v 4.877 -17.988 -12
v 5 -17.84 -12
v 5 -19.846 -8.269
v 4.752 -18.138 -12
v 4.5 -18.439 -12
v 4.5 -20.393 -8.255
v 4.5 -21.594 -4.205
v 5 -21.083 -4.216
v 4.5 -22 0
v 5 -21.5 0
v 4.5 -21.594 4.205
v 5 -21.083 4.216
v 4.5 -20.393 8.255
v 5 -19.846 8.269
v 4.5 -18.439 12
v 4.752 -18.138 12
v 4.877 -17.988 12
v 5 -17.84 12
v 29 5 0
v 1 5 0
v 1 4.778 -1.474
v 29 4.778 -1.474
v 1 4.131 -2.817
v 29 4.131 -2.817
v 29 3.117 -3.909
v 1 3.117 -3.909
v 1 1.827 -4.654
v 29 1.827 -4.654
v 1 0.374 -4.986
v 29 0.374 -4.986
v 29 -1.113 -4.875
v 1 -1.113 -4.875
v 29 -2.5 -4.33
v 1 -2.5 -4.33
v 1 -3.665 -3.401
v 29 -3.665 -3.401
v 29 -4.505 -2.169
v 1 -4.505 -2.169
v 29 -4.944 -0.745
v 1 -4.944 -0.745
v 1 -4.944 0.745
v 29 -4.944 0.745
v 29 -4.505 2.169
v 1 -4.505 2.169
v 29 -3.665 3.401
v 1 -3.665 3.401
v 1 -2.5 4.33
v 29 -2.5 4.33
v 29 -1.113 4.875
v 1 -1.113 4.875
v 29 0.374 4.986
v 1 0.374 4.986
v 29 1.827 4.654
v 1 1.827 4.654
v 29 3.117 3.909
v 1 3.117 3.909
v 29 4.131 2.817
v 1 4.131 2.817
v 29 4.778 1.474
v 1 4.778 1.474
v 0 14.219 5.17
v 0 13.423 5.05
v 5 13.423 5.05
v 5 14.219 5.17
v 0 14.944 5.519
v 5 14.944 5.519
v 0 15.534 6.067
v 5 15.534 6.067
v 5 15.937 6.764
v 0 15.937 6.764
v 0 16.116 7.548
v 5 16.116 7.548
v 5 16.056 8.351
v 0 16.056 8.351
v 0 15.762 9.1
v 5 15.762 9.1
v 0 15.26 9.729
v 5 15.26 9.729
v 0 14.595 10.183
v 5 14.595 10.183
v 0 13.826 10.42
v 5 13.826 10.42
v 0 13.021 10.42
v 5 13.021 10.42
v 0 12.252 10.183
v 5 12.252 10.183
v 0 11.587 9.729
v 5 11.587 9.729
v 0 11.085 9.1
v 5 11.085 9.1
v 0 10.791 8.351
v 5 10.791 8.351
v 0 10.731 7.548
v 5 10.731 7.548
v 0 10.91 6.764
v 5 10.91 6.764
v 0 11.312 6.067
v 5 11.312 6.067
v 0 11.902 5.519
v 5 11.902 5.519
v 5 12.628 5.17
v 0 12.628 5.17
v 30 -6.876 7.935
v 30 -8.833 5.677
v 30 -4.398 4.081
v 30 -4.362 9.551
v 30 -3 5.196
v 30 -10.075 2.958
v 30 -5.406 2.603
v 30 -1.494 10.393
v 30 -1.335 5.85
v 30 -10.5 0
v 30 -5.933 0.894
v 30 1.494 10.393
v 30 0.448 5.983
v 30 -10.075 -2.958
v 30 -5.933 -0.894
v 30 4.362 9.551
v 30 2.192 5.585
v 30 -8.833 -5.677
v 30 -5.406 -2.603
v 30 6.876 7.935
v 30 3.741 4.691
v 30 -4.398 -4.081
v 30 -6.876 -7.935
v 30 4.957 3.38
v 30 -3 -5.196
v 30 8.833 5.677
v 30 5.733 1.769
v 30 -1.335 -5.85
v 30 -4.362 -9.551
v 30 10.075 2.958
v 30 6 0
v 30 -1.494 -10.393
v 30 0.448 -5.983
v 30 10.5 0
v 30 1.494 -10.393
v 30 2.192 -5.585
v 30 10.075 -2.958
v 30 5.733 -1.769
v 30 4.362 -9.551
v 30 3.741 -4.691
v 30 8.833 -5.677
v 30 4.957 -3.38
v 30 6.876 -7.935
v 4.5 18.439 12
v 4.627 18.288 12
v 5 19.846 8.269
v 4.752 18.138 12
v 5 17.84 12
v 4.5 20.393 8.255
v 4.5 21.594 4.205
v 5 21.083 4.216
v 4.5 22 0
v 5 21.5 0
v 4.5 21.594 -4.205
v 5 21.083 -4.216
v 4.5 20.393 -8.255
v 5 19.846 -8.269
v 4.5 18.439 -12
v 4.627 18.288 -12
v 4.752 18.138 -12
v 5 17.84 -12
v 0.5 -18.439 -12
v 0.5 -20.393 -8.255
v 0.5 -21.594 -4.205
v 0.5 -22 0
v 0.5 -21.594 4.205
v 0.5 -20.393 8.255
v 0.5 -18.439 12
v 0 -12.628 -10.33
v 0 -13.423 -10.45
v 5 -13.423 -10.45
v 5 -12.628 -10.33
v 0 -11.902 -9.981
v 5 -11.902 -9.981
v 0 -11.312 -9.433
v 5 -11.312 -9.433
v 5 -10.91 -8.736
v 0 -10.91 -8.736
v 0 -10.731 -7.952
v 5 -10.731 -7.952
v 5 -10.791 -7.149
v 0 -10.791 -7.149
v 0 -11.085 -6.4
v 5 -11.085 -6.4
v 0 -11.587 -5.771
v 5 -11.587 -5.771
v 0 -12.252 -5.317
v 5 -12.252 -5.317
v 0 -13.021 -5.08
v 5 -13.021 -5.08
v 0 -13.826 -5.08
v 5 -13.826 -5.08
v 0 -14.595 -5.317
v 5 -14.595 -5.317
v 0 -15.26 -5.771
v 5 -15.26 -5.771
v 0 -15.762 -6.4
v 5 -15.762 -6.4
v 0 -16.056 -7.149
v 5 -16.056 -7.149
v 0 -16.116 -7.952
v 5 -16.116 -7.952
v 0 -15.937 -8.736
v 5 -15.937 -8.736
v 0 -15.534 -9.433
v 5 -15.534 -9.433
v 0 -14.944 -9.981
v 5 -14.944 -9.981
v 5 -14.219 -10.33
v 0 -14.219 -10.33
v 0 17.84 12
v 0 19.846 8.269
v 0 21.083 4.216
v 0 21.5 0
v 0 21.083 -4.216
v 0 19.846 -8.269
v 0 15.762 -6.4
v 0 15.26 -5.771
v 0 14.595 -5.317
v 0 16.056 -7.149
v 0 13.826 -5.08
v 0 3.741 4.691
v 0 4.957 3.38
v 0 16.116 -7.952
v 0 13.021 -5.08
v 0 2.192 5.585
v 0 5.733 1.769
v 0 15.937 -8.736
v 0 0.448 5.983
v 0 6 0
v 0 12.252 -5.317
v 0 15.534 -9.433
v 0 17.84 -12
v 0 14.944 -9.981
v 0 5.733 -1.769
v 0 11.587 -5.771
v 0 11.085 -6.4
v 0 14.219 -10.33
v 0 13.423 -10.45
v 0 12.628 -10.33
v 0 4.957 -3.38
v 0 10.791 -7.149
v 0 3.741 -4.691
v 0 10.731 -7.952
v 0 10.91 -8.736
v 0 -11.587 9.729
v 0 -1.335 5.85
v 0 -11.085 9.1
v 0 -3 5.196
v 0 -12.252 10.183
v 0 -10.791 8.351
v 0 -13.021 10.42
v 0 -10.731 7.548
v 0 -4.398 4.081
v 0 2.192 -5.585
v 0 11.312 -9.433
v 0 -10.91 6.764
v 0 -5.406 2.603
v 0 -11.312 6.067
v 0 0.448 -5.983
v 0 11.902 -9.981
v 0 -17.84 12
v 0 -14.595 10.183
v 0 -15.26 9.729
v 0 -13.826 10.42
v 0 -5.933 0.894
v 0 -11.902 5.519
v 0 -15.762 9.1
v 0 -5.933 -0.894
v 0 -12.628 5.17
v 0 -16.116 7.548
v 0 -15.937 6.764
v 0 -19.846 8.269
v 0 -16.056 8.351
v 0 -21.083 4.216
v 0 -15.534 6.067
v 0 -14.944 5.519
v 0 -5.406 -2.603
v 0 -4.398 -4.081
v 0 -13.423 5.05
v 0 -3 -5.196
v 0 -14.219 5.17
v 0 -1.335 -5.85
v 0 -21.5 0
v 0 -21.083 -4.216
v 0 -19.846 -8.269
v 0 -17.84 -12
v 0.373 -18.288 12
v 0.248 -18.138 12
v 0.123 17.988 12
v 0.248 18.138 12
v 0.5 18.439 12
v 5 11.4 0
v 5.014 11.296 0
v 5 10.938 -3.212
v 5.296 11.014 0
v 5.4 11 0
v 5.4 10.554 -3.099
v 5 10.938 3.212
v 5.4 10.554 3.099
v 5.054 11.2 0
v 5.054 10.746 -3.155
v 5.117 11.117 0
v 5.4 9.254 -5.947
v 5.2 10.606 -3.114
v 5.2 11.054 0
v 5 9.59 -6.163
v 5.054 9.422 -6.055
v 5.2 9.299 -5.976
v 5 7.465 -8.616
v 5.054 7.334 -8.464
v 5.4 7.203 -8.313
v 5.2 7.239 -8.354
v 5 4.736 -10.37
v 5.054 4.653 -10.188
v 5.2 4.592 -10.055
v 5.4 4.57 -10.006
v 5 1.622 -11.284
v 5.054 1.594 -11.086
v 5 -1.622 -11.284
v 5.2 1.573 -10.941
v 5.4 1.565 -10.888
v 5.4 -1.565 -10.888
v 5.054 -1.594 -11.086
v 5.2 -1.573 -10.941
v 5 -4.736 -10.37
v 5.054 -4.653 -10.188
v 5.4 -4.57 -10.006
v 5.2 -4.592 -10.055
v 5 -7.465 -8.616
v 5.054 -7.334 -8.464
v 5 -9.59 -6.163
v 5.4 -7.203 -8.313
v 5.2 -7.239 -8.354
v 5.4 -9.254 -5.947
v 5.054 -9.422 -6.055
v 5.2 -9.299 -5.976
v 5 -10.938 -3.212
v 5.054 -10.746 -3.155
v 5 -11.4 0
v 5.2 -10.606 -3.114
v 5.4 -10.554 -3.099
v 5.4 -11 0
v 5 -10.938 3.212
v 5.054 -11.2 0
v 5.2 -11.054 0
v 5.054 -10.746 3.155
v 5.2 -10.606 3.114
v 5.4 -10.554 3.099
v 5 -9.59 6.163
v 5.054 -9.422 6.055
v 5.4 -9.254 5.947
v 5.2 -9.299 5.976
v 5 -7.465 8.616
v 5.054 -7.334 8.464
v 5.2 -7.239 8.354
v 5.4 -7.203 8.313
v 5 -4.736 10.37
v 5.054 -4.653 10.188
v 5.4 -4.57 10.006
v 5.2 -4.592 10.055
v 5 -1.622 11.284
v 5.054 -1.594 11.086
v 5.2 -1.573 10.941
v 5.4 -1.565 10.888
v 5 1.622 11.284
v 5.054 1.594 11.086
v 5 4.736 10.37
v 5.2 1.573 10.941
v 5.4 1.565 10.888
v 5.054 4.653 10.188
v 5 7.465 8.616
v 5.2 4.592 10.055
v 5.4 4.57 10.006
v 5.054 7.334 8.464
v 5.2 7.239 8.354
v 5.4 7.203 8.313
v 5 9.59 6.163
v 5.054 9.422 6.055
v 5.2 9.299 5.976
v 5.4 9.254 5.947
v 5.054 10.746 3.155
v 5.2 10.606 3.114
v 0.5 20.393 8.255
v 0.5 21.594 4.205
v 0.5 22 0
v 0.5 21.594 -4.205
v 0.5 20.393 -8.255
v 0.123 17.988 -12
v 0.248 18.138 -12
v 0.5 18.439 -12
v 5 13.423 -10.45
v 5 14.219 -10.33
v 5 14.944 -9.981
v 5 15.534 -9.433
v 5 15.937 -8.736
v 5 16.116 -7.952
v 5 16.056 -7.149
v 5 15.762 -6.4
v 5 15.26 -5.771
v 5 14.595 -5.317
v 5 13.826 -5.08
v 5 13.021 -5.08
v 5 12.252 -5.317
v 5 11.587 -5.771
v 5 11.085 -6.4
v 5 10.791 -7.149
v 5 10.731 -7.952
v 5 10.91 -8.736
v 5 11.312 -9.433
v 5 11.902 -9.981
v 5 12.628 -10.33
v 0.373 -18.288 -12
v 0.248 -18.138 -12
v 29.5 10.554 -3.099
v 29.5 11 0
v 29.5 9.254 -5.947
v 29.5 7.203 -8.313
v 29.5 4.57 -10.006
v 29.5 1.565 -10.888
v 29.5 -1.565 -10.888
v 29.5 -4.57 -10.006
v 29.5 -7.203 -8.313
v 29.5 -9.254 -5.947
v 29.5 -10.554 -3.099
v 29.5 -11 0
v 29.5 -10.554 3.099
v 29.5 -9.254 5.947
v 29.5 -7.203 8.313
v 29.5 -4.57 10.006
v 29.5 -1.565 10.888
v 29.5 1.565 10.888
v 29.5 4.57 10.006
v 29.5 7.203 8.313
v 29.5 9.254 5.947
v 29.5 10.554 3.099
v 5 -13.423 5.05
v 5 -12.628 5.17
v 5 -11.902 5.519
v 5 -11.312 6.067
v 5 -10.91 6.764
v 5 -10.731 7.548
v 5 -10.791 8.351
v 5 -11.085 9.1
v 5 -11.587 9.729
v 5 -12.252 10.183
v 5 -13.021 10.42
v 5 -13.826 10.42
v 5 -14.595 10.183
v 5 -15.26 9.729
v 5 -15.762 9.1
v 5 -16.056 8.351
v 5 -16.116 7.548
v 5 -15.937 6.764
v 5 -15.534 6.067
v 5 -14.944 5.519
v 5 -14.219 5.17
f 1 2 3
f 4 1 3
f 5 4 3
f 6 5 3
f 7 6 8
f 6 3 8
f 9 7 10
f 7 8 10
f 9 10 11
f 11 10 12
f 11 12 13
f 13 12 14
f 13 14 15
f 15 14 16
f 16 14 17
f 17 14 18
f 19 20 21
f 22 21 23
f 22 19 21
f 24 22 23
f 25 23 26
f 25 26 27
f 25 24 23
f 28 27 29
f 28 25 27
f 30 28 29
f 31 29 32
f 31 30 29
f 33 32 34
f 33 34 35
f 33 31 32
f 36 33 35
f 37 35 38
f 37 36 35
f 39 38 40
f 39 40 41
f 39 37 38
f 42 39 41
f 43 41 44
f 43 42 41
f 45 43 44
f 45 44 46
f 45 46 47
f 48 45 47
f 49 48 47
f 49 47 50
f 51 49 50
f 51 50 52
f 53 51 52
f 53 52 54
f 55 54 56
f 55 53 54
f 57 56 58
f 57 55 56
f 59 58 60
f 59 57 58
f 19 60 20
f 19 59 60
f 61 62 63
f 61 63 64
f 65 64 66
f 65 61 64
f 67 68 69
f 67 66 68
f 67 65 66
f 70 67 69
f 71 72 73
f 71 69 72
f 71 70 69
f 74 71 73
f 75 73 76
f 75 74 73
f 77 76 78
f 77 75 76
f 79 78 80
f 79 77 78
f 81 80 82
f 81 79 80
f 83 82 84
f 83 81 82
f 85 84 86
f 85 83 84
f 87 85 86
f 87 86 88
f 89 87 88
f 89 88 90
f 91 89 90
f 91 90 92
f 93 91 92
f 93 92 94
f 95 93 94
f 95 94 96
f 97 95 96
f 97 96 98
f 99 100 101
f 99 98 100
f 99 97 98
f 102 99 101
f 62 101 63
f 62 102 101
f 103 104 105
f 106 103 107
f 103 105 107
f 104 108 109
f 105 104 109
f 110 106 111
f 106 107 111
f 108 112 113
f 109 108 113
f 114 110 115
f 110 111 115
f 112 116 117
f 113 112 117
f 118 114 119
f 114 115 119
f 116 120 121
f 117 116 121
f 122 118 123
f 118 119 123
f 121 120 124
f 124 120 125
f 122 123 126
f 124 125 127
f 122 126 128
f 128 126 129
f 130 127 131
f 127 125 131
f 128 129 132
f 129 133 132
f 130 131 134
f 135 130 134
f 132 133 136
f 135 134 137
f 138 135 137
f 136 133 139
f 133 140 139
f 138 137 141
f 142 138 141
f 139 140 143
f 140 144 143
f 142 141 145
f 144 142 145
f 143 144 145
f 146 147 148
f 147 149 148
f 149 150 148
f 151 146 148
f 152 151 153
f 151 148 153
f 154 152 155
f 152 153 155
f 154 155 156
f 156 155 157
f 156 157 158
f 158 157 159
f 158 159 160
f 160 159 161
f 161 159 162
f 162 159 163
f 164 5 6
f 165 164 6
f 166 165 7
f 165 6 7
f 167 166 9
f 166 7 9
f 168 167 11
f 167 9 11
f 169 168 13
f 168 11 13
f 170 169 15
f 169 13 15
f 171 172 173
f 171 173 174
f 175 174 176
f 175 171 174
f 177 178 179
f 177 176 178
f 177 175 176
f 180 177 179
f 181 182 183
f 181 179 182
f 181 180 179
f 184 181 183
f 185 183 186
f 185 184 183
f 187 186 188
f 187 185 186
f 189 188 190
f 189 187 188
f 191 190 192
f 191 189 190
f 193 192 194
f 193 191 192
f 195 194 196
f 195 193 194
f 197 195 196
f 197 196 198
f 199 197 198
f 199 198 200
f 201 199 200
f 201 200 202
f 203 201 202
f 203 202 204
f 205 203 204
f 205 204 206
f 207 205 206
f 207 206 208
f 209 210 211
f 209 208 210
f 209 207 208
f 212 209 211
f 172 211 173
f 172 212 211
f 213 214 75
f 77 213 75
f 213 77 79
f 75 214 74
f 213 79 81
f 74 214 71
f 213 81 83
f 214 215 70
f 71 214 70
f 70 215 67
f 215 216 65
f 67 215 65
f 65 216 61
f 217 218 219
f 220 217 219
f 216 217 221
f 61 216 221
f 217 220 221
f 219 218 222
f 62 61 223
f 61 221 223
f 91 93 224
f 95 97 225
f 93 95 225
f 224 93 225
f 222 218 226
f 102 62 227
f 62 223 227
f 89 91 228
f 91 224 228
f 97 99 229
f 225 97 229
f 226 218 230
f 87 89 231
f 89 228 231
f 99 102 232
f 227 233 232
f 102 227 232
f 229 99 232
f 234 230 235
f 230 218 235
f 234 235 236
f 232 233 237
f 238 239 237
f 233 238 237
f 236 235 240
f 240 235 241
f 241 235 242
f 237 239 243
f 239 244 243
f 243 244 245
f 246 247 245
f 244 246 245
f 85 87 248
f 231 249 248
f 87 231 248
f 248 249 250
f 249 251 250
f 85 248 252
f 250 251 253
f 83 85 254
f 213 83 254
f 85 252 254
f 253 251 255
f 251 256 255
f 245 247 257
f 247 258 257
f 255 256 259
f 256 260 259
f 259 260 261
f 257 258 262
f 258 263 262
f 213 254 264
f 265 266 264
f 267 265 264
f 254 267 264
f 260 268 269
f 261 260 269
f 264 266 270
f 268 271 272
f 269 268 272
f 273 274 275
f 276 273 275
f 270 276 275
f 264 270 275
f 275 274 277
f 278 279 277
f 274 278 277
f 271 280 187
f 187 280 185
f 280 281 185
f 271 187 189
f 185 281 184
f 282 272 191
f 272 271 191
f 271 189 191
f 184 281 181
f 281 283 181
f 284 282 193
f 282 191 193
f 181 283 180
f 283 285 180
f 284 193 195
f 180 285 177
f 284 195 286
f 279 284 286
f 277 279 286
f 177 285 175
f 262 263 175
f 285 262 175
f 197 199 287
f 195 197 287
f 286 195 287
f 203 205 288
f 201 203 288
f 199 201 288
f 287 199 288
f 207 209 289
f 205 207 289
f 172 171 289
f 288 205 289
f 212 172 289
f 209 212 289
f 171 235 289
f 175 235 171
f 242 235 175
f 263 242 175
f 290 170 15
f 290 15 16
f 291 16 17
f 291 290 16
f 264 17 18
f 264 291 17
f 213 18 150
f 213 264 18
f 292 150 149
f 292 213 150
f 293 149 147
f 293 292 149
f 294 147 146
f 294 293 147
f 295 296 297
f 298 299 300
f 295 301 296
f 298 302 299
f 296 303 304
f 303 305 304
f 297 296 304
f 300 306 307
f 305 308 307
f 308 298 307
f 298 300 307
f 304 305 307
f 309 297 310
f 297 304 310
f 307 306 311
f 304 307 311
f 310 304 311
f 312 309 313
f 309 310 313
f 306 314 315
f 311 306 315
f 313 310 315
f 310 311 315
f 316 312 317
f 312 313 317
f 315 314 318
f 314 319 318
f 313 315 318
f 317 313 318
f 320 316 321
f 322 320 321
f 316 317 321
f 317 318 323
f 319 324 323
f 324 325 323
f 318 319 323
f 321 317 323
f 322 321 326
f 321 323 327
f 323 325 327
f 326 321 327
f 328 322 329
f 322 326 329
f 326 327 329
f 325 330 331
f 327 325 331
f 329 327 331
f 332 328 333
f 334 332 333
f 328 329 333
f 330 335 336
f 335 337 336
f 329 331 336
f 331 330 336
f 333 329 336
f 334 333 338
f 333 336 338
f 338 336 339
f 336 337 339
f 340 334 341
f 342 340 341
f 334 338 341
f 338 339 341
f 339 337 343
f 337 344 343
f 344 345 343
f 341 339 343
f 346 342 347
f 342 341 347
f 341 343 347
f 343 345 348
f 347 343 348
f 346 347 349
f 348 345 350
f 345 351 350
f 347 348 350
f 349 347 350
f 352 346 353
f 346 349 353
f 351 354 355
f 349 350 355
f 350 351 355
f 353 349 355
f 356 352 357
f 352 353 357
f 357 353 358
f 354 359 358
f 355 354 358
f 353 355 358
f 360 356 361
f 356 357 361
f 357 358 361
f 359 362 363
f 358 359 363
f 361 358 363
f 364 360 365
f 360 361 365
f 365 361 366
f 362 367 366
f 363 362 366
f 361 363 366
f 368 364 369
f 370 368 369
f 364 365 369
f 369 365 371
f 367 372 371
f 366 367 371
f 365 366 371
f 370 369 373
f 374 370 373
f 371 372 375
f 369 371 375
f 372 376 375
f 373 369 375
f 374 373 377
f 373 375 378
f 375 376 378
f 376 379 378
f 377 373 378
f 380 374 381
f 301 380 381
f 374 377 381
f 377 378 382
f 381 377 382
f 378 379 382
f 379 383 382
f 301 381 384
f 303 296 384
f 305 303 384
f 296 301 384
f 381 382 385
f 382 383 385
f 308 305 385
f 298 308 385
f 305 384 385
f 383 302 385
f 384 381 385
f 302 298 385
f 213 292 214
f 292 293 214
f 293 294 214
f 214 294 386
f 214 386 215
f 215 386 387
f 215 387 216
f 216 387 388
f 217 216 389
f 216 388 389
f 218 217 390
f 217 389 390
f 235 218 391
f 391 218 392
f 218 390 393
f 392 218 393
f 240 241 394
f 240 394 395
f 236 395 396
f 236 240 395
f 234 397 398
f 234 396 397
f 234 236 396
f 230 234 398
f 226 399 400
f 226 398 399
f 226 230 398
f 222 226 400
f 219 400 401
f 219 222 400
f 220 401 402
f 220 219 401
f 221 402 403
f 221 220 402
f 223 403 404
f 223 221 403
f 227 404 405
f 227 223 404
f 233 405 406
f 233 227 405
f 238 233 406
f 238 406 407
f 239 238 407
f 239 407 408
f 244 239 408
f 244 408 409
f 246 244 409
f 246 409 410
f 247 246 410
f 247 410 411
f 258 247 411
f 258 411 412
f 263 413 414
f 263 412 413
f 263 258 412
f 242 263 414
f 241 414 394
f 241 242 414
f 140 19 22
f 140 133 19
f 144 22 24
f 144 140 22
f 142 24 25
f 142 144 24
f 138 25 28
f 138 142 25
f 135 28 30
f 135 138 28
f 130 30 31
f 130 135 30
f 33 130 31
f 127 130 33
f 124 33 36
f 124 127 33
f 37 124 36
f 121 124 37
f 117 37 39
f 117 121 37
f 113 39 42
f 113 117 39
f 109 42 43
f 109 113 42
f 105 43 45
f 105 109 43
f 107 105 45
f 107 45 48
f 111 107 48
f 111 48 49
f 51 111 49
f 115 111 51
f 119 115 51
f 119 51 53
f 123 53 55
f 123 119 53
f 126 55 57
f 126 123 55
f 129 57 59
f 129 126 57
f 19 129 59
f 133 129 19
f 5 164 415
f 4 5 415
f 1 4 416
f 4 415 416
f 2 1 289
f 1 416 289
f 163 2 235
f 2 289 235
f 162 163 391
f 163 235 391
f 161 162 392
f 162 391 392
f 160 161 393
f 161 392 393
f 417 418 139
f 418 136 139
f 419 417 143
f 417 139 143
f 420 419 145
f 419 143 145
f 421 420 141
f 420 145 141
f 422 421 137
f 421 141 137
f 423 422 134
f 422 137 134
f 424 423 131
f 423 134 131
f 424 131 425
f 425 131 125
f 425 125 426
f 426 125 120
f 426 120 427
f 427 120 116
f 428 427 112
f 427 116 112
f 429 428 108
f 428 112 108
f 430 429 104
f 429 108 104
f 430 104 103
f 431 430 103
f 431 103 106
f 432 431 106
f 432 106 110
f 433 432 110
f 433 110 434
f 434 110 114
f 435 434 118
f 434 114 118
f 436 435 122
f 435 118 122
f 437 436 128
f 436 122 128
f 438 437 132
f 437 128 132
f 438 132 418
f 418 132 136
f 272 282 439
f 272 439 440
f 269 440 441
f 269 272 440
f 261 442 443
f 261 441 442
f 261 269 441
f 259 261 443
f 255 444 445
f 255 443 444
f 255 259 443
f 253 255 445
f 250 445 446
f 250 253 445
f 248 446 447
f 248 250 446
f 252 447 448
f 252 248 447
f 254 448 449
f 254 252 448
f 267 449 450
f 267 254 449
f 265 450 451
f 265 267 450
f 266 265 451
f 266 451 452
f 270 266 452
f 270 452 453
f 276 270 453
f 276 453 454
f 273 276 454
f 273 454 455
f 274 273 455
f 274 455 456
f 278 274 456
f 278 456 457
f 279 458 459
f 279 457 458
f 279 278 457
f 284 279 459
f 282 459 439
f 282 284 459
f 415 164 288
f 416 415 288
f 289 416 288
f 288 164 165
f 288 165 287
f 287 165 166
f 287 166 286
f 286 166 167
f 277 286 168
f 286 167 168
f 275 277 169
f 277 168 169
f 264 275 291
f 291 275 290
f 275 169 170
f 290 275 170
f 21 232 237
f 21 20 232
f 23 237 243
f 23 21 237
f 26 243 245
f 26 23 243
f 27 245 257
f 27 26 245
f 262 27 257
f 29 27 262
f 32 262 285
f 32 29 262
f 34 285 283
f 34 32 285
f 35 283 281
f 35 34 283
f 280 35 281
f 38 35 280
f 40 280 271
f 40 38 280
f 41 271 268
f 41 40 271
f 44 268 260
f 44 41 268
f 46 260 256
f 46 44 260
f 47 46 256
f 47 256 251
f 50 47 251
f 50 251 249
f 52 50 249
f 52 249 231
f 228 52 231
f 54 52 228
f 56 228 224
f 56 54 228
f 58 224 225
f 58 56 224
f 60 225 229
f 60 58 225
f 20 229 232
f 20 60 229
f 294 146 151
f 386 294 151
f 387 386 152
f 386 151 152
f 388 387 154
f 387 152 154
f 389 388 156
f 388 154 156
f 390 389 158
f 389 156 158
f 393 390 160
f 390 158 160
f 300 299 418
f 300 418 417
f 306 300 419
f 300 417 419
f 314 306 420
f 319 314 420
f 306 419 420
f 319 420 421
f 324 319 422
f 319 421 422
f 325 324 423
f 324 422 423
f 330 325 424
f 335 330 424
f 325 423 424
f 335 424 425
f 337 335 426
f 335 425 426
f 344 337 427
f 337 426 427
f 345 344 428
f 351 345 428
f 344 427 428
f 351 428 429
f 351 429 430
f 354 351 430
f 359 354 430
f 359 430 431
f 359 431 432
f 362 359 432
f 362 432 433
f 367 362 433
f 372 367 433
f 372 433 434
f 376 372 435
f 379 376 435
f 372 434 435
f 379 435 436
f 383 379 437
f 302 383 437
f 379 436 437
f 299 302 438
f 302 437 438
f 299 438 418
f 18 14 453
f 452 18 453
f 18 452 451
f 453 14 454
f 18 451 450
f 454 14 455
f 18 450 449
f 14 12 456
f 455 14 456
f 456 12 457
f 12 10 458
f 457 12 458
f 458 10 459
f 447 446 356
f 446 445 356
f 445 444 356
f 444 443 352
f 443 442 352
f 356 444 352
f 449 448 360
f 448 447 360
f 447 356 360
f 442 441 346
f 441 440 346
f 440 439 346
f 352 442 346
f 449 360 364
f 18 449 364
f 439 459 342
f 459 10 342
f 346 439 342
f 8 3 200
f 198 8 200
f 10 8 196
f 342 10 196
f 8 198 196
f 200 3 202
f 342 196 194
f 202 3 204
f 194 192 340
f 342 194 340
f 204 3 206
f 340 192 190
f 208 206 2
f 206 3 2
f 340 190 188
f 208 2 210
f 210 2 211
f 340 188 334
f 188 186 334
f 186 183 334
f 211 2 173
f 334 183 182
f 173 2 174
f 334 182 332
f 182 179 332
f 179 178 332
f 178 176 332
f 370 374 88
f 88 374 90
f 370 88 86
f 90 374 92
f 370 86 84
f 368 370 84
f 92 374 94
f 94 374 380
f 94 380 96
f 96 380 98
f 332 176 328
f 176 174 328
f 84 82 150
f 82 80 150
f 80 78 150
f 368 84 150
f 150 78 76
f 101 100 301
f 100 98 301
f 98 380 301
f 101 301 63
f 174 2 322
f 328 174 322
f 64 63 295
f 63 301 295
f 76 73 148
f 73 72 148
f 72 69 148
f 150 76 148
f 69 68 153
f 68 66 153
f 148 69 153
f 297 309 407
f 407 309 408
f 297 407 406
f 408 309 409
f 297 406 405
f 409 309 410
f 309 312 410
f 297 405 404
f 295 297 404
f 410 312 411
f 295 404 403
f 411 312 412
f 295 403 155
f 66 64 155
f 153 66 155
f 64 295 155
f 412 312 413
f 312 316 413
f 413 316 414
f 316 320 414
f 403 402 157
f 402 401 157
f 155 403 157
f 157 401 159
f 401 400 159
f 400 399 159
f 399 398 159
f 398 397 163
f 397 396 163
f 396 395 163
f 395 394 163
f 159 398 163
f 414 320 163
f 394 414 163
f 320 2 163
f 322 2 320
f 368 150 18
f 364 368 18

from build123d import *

# Parameters (mm, degrees)
SKETCH3_W               = 48
SKETCH3_H               = 132
SKETCH3_W_2             = 24
SKETCH3_H_2             = 88
CUT_EXTRUDE1_DEPTH      = 7.5
CUT_EXTRUDE1_DEPTH_BACK = 7.5
SKETCH4_R               = 2.7
CUT_EXTRUDE2_DEPTH      = 6
SKETCH5_R               = 2.7
CUT_EXTRUDE3_DEPTH      = 6
SKETCH6_R               = 2.7
CUT_EXTRUDE4_DEPTH      = 6
SKETCH7_R               = 2.7
CUT_EXTRUDE5_DEPTH      = 6


with BuildPart() as part:
    # Sketch1 → Revolve1 (revolve)
    with BuildSketch(Plane.XY):
        with BuildLine():
            Line((0, 0), (0, 21.5))
            Line((0, 21.5), (0.5, 22))
            Line((0.5, 22), (4.5, 22))
            Line((4.5, 22), (5, 21.5))
            Line((5, 21.5), (5, 11.4))
            ThreePointArc((5, 11.4), (5.117157288, 11.117157288), (5.4, 11))
            Line((5.4, 11), (29.5, 11))
            Line((29.5, 11), (30, 10.5))
            Line((30, 10.5), (30, 0))
            Line((30, 0), (0, 0))
        make_face()
    revolve(axis=Axis((30, 0, 0), (-1, 0, 0)))

    # Sketch2 → Cut-Revolve1 (revolve, cut)
    with BuildSketch(Plane.XY):
        Polygon((0, 0), (0, 6), (1, 5), (29, 5), (30, 6), (30, 0), align=None)
    revolve(axis=Axis((30, 0, 0), (-1, 0, 0)), mode=Mode.SUBTRACT)

    # Sketch3 → Cut-Extrude1 (cut, two sides)
    with BuildSketch(Plane(origin=(0, 0, 0), x_dir=(0, 0, -1), z_dir=(1, 0, 0))) as cut_extrude1_sk:
        Rectangle(SKETCH3_W, SKETCH3_H)
        Rectangle(SKETCH3_W_2, SKETCH3_H_2, mode=Mode.SUBTRACT)
    extrude(amount=CUT_EXTRUDE1_DEPTH, mode=Mode.SUBTRACT)
    extrude(cut_extrude1_sk.sketch, amount=-CUT_EXTRUDE1_DEPTH_BACK, mode=Mode.SUBTRACT)

    # Sketch4 → Cut-Extrude2 (cut)
    with BuildSketch(Plane(origin=(-0.5, 0, 0), x_dir=(0, 0, -1), z_dir=(1, 0, 0))):
        with Locations((-7.75, 13.423393759)):
            Circle(SKETCH4_R)
    extrude(amount=CUT_EXTRUDE2_DEPTH, mode=Mode.SUBTRACT)

    # Sketch5 → Cut-Extrude3 (cut)
    with BuildSketch(Plane(origin=(-0.5, 0, 0), x_dir=(0, 0, -1), z_dir=(1, 0, 0))):
        with Locations((-7.75, -13.423393759)):
            Circle(SKETCH5_R)
    extrude(amount=CUT_EXTRUDE3_DEPTH, mode=Mode.SUBTRACT)

    # Sketch6 → Cut-Extrude4 (cut)
    with BuildSketch(Plane(origin=(-0.5, 0, 0), x_dir=(0, 0, -1), z_dir=(1, 0, 0))):
        with Locations((7.75, -13.423393759)):
            Circle(SKETCH6_R)
    extrude(amount=CUT_EXTRUDE4_DEPTH, mode=Mode.SUBTRACT)

    # Sketch7 → Cut-Extrude5 (cut)
    with BuildSketch(Plane(origin=(-0.5, 0, 0), x_dir=(0, 0, -1), z_dir=(1, 0, 0))):
        with Locations((7.75, 13.423393759)):
            Circle(SKETCH7_R)
    extrude(amount=CUT_EXTRUDE5_DEPTH, mode=Mode.SUBTRACT)


solid = part.part
